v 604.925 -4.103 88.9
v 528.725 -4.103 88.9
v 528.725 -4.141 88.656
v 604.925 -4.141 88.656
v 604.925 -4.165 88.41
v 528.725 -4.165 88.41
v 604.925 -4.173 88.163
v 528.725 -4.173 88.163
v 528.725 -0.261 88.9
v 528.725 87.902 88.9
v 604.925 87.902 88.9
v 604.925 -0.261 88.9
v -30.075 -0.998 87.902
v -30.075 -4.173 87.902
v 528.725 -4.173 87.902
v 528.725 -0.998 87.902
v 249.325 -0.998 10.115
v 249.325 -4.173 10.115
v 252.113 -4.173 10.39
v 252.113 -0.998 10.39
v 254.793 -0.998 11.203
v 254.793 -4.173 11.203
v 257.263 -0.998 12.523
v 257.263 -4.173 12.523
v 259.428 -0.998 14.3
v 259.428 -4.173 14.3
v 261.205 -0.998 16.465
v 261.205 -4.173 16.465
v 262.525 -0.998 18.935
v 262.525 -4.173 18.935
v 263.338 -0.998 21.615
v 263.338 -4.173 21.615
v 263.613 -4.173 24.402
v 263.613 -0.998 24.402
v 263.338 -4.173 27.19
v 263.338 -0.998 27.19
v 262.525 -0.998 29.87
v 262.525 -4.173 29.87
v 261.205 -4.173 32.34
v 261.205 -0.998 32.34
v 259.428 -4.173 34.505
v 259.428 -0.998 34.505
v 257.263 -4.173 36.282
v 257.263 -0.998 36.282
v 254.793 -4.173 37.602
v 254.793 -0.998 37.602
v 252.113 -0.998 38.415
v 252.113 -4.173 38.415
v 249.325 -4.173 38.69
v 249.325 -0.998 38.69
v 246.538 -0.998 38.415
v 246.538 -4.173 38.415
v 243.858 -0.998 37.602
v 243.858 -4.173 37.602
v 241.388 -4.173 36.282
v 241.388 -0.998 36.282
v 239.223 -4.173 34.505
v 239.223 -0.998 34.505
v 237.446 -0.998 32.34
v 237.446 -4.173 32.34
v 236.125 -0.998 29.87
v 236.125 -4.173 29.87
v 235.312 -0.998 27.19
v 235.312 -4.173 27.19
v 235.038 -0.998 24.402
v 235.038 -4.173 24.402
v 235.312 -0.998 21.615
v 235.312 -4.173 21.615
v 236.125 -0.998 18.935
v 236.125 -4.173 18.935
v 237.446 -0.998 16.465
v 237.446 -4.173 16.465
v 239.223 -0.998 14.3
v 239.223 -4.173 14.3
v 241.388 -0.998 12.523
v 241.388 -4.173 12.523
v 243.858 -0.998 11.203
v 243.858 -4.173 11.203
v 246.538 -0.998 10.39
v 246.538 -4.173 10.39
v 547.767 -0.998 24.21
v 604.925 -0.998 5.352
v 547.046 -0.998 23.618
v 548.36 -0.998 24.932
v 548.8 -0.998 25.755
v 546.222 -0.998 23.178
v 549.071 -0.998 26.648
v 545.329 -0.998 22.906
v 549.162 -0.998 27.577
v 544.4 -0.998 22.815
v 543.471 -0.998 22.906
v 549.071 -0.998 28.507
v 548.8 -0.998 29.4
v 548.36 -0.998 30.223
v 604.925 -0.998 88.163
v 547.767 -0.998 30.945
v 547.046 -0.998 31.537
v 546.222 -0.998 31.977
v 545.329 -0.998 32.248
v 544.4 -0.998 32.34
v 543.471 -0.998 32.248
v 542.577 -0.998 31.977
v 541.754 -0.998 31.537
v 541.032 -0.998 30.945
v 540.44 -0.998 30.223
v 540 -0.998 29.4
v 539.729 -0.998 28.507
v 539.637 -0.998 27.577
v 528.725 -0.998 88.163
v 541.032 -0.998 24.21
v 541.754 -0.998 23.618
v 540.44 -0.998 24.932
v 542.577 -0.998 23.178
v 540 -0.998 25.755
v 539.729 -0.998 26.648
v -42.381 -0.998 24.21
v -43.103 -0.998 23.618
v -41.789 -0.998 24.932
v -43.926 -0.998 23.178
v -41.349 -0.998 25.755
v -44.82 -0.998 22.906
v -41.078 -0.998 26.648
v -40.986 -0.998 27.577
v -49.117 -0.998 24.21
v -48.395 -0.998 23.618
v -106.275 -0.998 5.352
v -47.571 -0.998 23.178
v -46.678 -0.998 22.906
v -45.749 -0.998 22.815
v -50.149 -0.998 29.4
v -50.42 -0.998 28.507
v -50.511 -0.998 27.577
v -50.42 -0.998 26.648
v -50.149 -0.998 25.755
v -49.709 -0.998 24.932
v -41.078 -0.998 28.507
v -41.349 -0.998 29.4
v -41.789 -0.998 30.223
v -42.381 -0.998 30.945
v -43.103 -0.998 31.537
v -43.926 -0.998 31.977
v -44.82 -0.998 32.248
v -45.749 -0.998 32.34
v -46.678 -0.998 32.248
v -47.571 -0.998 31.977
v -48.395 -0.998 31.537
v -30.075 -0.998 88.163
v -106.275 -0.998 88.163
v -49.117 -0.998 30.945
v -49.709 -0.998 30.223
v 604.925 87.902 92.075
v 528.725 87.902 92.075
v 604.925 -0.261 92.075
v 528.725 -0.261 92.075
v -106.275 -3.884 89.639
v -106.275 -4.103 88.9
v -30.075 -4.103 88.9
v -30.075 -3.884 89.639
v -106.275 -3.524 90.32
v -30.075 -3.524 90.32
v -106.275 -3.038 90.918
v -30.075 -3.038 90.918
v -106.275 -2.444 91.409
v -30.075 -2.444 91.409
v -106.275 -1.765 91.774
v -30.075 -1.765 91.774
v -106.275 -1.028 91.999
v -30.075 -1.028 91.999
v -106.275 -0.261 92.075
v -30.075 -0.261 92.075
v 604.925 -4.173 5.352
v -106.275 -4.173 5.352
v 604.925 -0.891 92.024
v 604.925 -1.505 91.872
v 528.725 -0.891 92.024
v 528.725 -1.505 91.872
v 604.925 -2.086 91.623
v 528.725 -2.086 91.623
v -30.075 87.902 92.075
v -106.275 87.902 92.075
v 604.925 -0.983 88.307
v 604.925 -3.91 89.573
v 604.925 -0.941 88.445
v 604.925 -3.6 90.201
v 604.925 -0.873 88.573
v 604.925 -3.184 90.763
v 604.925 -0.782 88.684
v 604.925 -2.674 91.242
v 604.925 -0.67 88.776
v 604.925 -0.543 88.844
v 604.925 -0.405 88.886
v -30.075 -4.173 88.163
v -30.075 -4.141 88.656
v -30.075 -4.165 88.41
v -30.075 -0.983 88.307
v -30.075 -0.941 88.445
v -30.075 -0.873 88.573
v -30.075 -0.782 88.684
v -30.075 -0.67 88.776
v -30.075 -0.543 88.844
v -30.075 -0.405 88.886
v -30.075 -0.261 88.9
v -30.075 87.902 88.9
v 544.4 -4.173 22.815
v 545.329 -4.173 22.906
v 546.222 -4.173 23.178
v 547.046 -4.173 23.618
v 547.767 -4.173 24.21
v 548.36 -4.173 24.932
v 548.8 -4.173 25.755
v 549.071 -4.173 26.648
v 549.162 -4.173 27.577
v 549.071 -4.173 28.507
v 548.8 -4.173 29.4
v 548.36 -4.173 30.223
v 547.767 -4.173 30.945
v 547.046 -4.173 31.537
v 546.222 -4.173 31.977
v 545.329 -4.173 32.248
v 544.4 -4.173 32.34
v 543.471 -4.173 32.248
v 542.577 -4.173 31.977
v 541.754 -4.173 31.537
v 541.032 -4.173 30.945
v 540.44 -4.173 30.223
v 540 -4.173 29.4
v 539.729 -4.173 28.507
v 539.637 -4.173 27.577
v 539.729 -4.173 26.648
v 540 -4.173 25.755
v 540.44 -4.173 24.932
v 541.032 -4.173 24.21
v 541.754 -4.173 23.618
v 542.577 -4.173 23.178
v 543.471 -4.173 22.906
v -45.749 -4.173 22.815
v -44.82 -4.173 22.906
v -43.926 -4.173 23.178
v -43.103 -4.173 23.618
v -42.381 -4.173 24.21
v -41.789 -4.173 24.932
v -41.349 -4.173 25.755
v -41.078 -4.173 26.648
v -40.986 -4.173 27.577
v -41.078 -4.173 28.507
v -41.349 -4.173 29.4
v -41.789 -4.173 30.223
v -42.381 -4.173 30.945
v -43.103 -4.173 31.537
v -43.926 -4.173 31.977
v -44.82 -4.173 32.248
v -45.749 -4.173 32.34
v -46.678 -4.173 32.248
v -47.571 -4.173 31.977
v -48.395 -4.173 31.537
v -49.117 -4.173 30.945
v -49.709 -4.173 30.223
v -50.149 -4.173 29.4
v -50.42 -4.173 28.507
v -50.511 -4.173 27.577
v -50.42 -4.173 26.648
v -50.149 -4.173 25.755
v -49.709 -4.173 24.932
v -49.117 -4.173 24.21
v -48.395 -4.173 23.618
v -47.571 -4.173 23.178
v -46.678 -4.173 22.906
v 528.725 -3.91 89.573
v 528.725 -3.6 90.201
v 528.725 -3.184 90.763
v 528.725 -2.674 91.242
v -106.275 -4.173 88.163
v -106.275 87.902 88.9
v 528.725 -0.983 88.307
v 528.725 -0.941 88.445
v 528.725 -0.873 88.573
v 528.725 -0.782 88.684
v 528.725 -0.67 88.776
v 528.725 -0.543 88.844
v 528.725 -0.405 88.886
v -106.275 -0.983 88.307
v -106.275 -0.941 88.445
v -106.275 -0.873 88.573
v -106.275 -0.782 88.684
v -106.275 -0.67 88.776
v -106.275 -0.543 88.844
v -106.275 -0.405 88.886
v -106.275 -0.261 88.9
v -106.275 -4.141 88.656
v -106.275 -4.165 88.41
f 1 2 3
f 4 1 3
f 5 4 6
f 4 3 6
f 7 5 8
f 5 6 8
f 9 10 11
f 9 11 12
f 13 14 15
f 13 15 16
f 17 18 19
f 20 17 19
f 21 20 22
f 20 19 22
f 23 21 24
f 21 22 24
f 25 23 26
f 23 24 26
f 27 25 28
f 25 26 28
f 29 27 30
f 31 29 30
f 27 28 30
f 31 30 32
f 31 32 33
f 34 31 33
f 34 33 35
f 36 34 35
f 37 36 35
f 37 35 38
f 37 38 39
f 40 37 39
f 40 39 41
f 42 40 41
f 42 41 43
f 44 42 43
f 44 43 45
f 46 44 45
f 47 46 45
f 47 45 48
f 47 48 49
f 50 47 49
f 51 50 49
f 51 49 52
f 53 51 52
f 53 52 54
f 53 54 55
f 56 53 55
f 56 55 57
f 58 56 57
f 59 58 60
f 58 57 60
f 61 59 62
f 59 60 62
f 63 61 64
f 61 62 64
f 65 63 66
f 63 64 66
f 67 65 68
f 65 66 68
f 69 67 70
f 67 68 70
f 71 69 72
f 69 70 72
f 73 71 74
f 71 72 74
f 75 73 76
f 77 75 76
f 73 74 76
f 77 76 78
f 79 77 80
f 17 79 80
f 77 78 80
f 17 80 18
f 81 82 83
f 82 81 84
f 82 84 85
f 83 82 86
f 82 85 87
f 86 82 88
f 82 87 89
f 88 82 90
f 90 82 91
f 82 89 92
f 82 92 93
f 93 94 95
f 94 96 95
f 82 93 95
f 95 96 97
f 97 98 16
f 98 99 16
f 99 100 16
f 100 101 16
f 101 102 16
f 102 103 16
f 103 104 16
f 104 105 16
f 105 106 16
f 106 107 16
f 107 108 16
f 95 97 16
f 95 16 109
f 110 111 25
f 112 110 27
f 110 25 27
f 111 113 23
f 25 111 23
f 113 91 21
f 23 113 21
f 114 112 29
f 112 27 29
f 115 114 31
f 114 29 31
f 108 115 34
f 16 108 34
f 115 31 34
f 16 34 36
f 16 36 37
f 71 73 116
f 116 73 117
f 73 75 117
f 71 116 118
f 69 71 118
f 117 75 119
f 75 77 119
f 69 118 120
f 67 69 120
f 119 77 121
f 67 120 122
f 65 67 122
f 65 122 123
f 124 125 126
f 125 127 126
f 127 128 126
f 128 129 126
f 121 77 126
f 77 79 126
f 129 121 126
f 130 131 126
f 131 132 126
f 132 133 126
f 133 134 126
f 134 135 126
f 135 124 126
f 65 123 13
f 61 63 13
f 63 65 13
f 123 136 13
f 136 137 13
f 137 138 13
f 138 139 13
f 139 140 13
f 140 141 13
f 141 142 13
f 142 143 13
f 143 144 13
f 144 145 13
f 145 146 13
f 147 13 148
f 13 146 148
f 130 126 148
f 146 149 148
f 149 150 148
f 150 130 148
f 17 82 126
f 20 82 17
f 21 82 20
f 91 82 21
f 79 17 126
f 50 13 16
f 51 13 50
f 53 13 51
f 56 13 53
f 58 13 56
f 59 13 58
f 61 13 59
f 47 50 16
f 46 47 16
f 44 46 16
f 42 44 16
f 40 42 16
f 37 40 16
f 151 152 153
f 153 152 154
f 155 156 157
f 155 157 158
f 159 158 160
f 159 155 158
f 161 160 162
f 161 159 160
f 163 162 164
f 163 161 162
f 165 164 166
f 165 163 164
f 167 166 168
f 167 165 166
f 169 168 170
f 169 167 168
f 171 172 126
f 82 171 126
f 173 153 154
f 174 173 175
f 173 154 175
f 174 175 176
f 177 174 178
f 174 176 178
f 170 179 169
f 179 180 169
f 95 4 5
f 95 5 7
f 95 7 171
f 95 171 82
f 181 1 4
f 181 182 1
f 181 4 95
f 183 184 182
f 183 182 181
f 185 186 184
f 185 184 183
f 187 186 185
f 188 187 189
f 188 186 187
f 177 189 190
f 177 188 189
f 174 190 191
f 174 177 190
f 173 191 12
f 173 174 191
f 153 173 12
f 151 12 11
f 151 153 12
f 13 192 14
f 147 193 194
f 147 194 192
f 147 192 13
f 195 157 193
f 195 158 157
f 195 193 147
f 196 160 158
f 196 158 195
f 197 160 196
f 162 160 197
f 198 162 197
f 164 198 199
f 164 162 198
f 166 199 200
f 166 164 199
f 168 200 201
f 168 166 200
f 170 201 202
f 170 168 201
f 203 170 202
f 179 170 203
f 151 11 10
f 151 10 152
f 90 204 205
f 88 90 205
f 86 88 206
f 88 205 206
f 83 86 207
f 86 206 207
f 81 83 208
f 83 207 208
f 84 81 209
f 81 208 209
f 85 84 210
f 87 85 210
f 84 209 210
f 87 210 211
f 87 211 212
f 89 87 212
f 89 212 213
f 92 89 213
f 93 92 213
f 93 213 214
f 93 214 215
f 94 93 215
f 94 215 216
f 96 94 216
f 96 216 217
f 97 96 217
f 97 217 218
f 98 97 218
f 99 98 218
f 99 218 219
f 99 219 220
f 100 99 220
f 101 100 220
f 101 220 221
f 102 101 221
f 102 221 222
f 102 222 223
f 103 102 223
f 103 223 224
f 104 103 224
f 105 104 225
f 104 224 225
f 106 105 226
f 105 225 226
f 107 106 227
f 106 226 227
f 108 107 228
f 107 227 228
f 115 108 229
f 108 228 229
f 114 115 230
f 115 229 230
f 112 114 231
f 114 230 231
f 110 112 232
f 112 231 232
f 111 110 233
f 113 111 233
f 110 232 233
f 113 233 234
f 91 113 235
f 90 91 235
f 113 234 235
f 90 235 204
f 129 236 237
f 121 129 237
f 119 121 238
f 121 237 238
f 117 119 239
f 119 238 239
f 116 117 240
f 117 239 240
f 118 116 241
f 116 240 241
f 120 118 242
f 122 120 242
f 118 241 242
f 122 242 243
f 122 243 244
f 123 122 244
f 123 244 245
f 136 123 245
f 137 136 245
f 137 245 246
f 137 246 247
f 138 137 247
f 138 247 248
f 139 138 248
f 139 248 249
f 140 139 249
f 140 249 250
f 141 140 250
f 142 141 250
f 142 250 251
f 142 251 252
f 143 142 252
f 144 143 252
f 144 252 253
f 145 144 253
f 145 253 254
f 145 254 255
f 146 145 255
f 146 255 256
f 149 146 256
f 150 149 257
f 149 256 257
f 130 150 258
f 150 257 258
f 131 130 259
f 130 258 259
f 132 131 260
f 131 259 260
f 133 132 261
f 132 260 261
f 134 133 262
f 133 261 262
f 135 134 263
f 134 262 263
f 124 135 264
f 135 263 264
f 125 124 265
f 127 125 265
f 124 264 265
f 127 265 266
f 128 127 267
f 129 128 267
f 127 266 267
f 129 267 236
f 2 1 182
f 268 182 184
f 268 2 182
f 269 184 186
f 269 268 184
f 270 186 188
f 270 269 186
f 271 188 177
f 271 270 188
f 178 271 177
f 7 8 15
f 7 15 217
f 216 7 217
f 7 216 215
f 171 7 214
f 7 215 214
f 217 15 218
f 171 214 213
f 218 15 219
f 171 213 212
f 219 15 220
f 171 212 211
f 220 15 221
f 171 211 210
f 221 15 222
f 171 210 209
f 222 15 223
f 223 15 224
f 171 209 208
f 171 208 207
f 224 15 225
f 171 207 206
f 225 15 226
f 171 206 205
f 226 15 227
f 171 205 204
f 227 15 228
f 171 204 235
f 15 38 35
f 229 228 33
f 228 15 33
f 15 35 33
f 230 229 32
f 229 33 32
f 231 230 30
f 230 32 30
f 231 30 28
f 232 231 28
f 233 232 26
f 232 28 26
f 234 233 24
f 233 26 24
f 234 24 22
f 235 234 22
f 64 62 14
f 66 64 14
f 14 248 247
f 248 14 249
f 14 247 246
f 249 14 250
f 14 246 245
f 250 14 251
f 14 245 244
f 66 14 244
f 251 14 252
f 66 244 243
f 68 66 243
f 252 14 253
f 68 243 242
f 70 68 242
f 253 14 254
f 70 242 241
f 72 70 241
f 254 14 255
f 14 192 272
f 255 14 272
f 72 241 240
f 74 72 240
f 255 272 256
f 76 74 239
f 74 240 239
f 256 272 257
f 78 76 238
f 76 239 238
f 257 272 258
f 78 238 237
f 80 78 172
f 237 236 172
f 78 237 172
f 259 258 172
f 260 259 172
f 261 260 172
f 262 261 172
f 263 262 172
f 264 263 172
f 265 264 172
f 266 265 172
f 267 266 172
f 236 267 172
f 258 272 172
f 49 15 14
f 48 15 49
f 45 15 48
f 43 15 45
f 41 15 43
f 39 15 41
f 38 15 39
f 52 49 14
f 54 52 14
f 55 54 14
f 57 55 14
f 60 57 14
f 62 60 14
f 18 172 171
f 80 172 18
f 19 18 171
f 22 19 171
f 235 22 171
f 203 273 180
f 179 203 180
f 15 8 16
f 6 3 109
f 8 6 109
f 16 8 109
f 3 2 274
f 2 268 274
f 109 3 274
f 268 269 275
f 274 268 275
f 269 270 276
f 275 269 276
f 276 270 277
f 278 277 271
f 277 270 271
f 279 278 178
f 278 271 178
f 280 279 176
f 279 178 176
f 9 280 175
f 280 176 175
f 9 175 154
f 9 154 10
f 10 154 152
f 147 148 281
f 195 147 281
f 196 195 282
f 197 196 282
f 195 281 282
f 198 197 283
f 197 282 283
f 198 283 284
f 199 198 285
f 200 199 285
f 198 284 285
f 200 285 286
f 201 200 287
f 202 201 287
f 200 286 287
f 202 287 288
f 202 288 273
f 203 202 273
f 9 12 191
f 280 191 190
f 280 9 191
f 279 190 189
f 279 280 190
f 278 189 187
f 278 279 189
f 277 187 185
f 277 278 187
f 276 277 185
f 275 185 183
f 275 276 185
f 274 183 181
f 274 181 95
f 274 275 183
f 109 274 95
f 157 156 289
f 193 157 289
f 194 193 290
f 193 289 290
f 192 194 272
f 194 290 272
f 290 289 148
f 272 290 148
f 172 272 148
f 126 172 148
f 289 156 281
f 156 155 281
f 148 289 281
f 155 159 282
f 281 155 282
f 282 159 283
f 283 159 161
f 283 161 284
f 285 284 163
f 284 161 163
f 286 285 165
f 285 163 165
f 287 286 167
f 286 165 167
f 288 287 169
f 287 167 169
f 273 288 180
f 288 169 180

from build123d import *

# Parameters (mm, degrees)
SKETCH18_W                   = 711.2
SKETCH18_H                   = 3.175
BASE_FLANGE1_DEPTH           = 174.625
SKETCH23_W                   = 215.9
SKETCH23_H                   = 88.9
CUT_EXTRUDE1_DEPTH           = 630.633777431
SKETCH24_W                   = 127
SKETCH24_H                   = 34.925
CUT_EXTRUDE2_DEPTH           = 630.633777431
SKETCH25_W                   = 215.9
SKETCH25_H                   = 88.9
CUT_EXTRUDE3_DEPTH           = 630.633777431
SKETCH32_W                   = 558.8
SKETCH32_H                   = 92.075
CUT_EXTRUDE6_DEPTH           = 630.633777431
SKETCHED_START               = -106.274614162
SKETCHED_BEND1_OUTLINE_W     = 3.175
SKETCHED_BEND1_OUTLINE_H     = 88.9
SKETCHED_BEND1_OUTLINE_H_2   = 82.55
SKETCHED_BEND1_DEPTH         = 635
SKETCHED_START_2             = 528.725385838
SKETCHED_BEND1_2_DEPTH       = 76.2
SKETCHED_BEND1_3_OUTLINE_W   = 82.55
SKETCHED_BEND1_3_OUTLINE_H   = 3.175
SKETCHED_BEND1_3_DEPTH       = 711.2
SKETCHED_BEND1_4_OUTLINE_W   = 0.997512257
SKETCHED_BEND1_4_OUTLINE_H   = 3.175
SKETCHED_BEND1_4_OUTLINE_W_2 = 87.902487743
SKETCHED_BEND1_4_DEPTH       = 76.2
SKETCHED_BEND1_5_DEPTH       = 76.2
SKETCHED_BEND2_DEPTH         = 711.2
SKETCHED_BEND2_2_OUTLINE_W   = 3.175
SKETCHED_BEND2_2_OUTLINE_H   = 82.55
SKETCHED_BEND2_2_DEPTH       = 711.2
SKETCHED_BEND2_3_DEPTH       = 76.2
SKETCHED_BEND2_4_DEPTH       = 76.2
SKETCH35_R                   = 14.2875
SKETCH35_R_2                 = 4.7625
CUT_EXTRUDE7_DEPTH           = 619.781329454


# Read off the part's stored shape, not the designer's step: Sketched Bend1, Sketched Bend2
# Sheet-metal steps are written as plain solids
with BuildPart() as part:
    # Sketch18 → Base-Flange1 (new body)
    with BuildSketch(Plane.XY):
        with Locations((249.325385838, -1.5875)):
            Rectangle(SKETCH18_W, SKETCH18_H)
    extrude(amount=BASE_FLANGE1_DEPTH)

    # Sketch23 → Cut-Extrude1 (cut, through all)
    with BuildSketch(Plane(origin=(0, 0, 0), x_dir=(1, 0, 0), z_dir=(0, 1, 0))):
        with Locations((77.875385838, -44.45)):
            Rectangle(SKETCH23_W, SKETCH23_H)
    extrude(amount=-CUT_EXTRUDE1_DEPTH, mode=Mode.SUBTRACT)

    # Sketch24 → Cut-Extrude2 (cut, through all)
    with BuildSketch(Plane(origin=(0, 0, 0), x_dir=(1, 0, 0), z_dir=(0, 1, 0))):
        with Locations((249.325385838, -17.4625)):
            Rectangle(SKETCH24_W, SKETCH24_H)
    extrude(amount=-CUT_EXTRUDE2_DEPTH, mode=Mode.SUBTRACT)

    # Sketch25 → Cut-Extrude3 (cut, through all)
    with BuildSketch(Plane(origin=(0, 0, 0), x_dir=(1, 0, 0), z_dir=(0, 1, 0))):
        with Locations((420.775385838, -44.45)):
            Rectangle(SKETCH25_W, SKETCH25_H)
    extrude(amount=-CUT_EXTRUDE3_DEPTH, mode=Mode.SUBTRACT)

    # Sketch32 → Cut-Extrude6 (cut, through all)
    with BuildSketch(Plane.XZ.offset(3.175)):
        with Locations((249.325385838, 46.0375)):
            Rectangle(SKETCH32_W, SKETCH32_H)
    extrude(amount=-CUT_EXTRUDE6_DEPTH, mode=Mode.SUBTRACT)

    # Sketched Bend1 outline → Sketched Bend1 (cut)
    with BuildSketch(Plane.YZ.offset(SKETCHED_START)):
        with Locations((-1.5875, 44.45)):
            Rectangle(SKETCHED_BEND1_OUTLINE_W, SKETCHED_BEND1_OUTLINE_H)
        with Locations((-1.5875, 133.35)):
            Rectangle(SKETCHED_BEND1_OUTLINE_W, SKETCHED_BEND1_OUTLINE_H_2)
    extrude(amount=SKETCHED_BEND1_DEPTH, mode=Mode.SUBTRACT)

    # Sketched Bend1 2 outline → Sketched Bend1 2 (cut)
    with BuildSketch(Plane.YZ.offset(SKETCHED_START_2)):
        with BuildLine():
            ThreePointArc((-3.175, 92.005018799), (-0.896479843, 90.655319942), (0, 88.1634))
            Line((0, 88.1634), (0, 174.625))
            Line((0, 174.625), (-3.175, 174.625))
            Line((-3.175, 174.625), (-3.175, 92.005018799))
        make_face()
    extrude(amount=SKETCHED_BEND1_2_DEPTH, mode=Mode.SUBTRACT)



with BuildPart() as body_2:
    # Sketched Bend1 3 outline → Sketched Bend1 3 (new body)
    with BuildSketch(Plane.YZ.offset(SKETCHED_START)):
        with Locations((-45.447512257, 90.4875)):
            Rectangle(SKETCHED_BEND1_3_OUTLINE_W, SKETCHED_BEND1_3_OUTLINE_H)
    extrude(amount=SKETCHED_BEND1_3_DEPTH)


with BuildPart() as part_1:
    add(part.part)

    add(body_2.part)  # Sketched Bend1 4 merges body 2
    # Sketched Bend1 4 outline → Sketched Bend1 4 (add)
    with BuildSketch(Plane.YZ.offset(SKETCHED_START)):
        with Locations((-3.673756128, 90.4875)):
            Rectangle(SKETCHED_BEND1_4_OUTLINE_W, SKETCHED_BEND1_4_OUTLINE_H)
        with Locations((43.951243872, 90.4875)):
            Rectangle(SKETCHED_BEND1_4_OUTLINE_W_2, SKETCHED_BEND1_4_OUTLINE_H)
    extrude(amount=SKETCHED_BEND1_4_DEPTH)

    # Sketched Bend1 5 outline → Sketched Bend1 5 (add)
    with BuildSketch(Plane.YZ.offset(SKETCHED_START_2)):
        with BuildLine():
            Line((-4.172512257, 88.9), (-3.9116, 88.9))
            ThreePointArc((-3.9116, 88.9), (-3.390745145, 88.684254855), (-3.175, 88.1634))
            Line((-3.175, 88.1634), (-3.175, 92.005018799))
            ThreePointArc((-3.175, 92.005018799), (-3.541641581, 92.057465398), (-3.9116, 92.075))
            Line((-3.9116, 92.075), (-4.172512257, 92.075))
            Line((-4.172512257, 92.075), (-4.172512257, 88.9))
        make_face()
    extrude(amount=SKETCHED_BEND1_5_DEPTH)

    # Sketched Bend2 outline → Sketched Bend2 (cut)
    with BuildSketch(Plane.YZ.offset(SKETCHED_START)):
        with BuildLine():
            ThreePointArc((-4.102531056, 88.9), (-2.752832199, 91.178520157), (-0.260912257, 92.075))
            Line((-0.260912257, 92.075), (-86.722512257, 92.075))
            Line((-86.722512257, 92.075), (-86.722512257, 88.9))
            Line((-86.722512257, 88.9), (-4.102531056, 88.9))
        make_face()
        with BuildLine():
            Line((-0.997512257, 5.352487743), (-3.175, 5.352487743))
            Line((-3.175, 5.352487743), (-3.175, 0))
            Line((-3.175, 0), (0, 0))
            Line((0, 0), (0, 88.1634))
            ThreePointArc((0, 88.1634), (-0.017534602, 88.533358419), (-0.069981201, 88.9))
            Line((-0.069981201, 88.9), (-0.260912257, 88.9))
            ThreePointArc((-0.260912257, 88.9), (-0.781767112, 88.684254855), (-0.997512257, 88.1634))
            Line((-0.997512257, 88.1634), (-0.997512257, 5.352487743))
        make_face()
    extrude(amount=SKETCHED_BEND2_DEPTH, mode=Mode.SUBTRACT)

    # Sketched Bend2 2 outline → Sketched Bend2 2 (add)
    with BuildSketch(Plane.YZ.offset(SKETCHED_START)):
        with Locations((-2.585012257, 46.627487743)):
            Rectangle(SKETCHED_BEND2_2_OUTLINE_W, SKETCHED_BEND2_2_OUTLINE_H)
    extrude(amount=SKETCHED_BEND2_2_DEPTH)

    # Sketched Bend2 3 outline → Sketched Bend2 3 (add)
    with BuildSketch(Plane.YZ.offset(SKETCHED_START_2)):
        with BuildLine():
            ThreePointArc((-4.102531056, 88.9), (-4.154977655, 88.533358419), (-4.172512257, 88.1634))
            Line((-4.172512257, 88.1634), (-4.172512257, 87.902487743))
            Line((-4.172512257, 87.902487743), (-3.175, 87.902487743))
            Line((-3.175, 87.902487743), (-3.175, 88.1634))
            ThreePointArc((-3.175, 88.1634), (-3.390745145, 88.684254855), (-3.9116, 88.9))
            Line((-3.9116, 88.9), (-4.102531056, 88.9))
        make_face()
        with BuildLine():
            ThreePointArc((-0.260912257, 92.075), (-1.201151194, 91.960315235), (-2.086256128, 91.622985858))
            ThreePointArc((-2.086256128, 91.622985858), (-0.767990693, 90.491131747), (-0.069981201, 88.9))
            Line((-0.069981201, 88.9), (87.902487743, 88.9))
            Line((87.902487743, 88.9), (87.902487743, 92.075))
            Line((87.902487743, 92.075), (-0.260912257, 92.075))
        make_face()
    extrude(amount=SKETCHED_BEND2_3_DEPTH)

    # Sketched Bend2 4 outline → Sketched Bend2 4 (add)
    with BuildSketch(Plane.YZ.offset(SKETCHED_START)):
        with BuildLine():
            ThreePointArc((-4.102531056, 88.9), (-4.154977655, 88.533358419), (-4.172512257, 88.1634))
            Line((-4.172512257, 88.1634), (-4.172512257, 87.902487743))
            Line((-4.172512257, 87.902487743), (-0.997512257, 87.902487743))
            Line((-0.997512257, 87.902487743), (-0.997512257, 88.1634))
            ThreePointArc((-0.997512257, 88.1634), (-0.781767112, 88.684254855), (-0.260912257, 88.9))
            Line((-0.260912257, 88.9), (-4.102531056, 88.9))
        make_face()
    extrude(amount=SKETCHED_BEND2_4_DEPTH)

    # Sketch35 → Cut-Extrude7 (cut, through all)
    with BuildSketch(Plane(origin=(0, -4.172512257, 0), x_dir=(-1, 0, 0), z_dir=(0, -1, 0))):
        with Locations(Location((-249.325385838, -24.402487743, 0), (0, 0, 90))):
            Circle(SKETCH35_R)
        with Locations(Location((-544.399725838, -27.577487743, 0), (0, 0, 90))):
            Circle(SKETCH35_R_2)
        with Locations(Location((45.748954162, -27.577487743, 0), (0, 0, 90))):
            Circle(SKETCH35_R_2)
    extrude(amount=-CUT_EXTRUDE7_DEPTH, mode=Mode.SUBTRACT)


solid = part_1.part
